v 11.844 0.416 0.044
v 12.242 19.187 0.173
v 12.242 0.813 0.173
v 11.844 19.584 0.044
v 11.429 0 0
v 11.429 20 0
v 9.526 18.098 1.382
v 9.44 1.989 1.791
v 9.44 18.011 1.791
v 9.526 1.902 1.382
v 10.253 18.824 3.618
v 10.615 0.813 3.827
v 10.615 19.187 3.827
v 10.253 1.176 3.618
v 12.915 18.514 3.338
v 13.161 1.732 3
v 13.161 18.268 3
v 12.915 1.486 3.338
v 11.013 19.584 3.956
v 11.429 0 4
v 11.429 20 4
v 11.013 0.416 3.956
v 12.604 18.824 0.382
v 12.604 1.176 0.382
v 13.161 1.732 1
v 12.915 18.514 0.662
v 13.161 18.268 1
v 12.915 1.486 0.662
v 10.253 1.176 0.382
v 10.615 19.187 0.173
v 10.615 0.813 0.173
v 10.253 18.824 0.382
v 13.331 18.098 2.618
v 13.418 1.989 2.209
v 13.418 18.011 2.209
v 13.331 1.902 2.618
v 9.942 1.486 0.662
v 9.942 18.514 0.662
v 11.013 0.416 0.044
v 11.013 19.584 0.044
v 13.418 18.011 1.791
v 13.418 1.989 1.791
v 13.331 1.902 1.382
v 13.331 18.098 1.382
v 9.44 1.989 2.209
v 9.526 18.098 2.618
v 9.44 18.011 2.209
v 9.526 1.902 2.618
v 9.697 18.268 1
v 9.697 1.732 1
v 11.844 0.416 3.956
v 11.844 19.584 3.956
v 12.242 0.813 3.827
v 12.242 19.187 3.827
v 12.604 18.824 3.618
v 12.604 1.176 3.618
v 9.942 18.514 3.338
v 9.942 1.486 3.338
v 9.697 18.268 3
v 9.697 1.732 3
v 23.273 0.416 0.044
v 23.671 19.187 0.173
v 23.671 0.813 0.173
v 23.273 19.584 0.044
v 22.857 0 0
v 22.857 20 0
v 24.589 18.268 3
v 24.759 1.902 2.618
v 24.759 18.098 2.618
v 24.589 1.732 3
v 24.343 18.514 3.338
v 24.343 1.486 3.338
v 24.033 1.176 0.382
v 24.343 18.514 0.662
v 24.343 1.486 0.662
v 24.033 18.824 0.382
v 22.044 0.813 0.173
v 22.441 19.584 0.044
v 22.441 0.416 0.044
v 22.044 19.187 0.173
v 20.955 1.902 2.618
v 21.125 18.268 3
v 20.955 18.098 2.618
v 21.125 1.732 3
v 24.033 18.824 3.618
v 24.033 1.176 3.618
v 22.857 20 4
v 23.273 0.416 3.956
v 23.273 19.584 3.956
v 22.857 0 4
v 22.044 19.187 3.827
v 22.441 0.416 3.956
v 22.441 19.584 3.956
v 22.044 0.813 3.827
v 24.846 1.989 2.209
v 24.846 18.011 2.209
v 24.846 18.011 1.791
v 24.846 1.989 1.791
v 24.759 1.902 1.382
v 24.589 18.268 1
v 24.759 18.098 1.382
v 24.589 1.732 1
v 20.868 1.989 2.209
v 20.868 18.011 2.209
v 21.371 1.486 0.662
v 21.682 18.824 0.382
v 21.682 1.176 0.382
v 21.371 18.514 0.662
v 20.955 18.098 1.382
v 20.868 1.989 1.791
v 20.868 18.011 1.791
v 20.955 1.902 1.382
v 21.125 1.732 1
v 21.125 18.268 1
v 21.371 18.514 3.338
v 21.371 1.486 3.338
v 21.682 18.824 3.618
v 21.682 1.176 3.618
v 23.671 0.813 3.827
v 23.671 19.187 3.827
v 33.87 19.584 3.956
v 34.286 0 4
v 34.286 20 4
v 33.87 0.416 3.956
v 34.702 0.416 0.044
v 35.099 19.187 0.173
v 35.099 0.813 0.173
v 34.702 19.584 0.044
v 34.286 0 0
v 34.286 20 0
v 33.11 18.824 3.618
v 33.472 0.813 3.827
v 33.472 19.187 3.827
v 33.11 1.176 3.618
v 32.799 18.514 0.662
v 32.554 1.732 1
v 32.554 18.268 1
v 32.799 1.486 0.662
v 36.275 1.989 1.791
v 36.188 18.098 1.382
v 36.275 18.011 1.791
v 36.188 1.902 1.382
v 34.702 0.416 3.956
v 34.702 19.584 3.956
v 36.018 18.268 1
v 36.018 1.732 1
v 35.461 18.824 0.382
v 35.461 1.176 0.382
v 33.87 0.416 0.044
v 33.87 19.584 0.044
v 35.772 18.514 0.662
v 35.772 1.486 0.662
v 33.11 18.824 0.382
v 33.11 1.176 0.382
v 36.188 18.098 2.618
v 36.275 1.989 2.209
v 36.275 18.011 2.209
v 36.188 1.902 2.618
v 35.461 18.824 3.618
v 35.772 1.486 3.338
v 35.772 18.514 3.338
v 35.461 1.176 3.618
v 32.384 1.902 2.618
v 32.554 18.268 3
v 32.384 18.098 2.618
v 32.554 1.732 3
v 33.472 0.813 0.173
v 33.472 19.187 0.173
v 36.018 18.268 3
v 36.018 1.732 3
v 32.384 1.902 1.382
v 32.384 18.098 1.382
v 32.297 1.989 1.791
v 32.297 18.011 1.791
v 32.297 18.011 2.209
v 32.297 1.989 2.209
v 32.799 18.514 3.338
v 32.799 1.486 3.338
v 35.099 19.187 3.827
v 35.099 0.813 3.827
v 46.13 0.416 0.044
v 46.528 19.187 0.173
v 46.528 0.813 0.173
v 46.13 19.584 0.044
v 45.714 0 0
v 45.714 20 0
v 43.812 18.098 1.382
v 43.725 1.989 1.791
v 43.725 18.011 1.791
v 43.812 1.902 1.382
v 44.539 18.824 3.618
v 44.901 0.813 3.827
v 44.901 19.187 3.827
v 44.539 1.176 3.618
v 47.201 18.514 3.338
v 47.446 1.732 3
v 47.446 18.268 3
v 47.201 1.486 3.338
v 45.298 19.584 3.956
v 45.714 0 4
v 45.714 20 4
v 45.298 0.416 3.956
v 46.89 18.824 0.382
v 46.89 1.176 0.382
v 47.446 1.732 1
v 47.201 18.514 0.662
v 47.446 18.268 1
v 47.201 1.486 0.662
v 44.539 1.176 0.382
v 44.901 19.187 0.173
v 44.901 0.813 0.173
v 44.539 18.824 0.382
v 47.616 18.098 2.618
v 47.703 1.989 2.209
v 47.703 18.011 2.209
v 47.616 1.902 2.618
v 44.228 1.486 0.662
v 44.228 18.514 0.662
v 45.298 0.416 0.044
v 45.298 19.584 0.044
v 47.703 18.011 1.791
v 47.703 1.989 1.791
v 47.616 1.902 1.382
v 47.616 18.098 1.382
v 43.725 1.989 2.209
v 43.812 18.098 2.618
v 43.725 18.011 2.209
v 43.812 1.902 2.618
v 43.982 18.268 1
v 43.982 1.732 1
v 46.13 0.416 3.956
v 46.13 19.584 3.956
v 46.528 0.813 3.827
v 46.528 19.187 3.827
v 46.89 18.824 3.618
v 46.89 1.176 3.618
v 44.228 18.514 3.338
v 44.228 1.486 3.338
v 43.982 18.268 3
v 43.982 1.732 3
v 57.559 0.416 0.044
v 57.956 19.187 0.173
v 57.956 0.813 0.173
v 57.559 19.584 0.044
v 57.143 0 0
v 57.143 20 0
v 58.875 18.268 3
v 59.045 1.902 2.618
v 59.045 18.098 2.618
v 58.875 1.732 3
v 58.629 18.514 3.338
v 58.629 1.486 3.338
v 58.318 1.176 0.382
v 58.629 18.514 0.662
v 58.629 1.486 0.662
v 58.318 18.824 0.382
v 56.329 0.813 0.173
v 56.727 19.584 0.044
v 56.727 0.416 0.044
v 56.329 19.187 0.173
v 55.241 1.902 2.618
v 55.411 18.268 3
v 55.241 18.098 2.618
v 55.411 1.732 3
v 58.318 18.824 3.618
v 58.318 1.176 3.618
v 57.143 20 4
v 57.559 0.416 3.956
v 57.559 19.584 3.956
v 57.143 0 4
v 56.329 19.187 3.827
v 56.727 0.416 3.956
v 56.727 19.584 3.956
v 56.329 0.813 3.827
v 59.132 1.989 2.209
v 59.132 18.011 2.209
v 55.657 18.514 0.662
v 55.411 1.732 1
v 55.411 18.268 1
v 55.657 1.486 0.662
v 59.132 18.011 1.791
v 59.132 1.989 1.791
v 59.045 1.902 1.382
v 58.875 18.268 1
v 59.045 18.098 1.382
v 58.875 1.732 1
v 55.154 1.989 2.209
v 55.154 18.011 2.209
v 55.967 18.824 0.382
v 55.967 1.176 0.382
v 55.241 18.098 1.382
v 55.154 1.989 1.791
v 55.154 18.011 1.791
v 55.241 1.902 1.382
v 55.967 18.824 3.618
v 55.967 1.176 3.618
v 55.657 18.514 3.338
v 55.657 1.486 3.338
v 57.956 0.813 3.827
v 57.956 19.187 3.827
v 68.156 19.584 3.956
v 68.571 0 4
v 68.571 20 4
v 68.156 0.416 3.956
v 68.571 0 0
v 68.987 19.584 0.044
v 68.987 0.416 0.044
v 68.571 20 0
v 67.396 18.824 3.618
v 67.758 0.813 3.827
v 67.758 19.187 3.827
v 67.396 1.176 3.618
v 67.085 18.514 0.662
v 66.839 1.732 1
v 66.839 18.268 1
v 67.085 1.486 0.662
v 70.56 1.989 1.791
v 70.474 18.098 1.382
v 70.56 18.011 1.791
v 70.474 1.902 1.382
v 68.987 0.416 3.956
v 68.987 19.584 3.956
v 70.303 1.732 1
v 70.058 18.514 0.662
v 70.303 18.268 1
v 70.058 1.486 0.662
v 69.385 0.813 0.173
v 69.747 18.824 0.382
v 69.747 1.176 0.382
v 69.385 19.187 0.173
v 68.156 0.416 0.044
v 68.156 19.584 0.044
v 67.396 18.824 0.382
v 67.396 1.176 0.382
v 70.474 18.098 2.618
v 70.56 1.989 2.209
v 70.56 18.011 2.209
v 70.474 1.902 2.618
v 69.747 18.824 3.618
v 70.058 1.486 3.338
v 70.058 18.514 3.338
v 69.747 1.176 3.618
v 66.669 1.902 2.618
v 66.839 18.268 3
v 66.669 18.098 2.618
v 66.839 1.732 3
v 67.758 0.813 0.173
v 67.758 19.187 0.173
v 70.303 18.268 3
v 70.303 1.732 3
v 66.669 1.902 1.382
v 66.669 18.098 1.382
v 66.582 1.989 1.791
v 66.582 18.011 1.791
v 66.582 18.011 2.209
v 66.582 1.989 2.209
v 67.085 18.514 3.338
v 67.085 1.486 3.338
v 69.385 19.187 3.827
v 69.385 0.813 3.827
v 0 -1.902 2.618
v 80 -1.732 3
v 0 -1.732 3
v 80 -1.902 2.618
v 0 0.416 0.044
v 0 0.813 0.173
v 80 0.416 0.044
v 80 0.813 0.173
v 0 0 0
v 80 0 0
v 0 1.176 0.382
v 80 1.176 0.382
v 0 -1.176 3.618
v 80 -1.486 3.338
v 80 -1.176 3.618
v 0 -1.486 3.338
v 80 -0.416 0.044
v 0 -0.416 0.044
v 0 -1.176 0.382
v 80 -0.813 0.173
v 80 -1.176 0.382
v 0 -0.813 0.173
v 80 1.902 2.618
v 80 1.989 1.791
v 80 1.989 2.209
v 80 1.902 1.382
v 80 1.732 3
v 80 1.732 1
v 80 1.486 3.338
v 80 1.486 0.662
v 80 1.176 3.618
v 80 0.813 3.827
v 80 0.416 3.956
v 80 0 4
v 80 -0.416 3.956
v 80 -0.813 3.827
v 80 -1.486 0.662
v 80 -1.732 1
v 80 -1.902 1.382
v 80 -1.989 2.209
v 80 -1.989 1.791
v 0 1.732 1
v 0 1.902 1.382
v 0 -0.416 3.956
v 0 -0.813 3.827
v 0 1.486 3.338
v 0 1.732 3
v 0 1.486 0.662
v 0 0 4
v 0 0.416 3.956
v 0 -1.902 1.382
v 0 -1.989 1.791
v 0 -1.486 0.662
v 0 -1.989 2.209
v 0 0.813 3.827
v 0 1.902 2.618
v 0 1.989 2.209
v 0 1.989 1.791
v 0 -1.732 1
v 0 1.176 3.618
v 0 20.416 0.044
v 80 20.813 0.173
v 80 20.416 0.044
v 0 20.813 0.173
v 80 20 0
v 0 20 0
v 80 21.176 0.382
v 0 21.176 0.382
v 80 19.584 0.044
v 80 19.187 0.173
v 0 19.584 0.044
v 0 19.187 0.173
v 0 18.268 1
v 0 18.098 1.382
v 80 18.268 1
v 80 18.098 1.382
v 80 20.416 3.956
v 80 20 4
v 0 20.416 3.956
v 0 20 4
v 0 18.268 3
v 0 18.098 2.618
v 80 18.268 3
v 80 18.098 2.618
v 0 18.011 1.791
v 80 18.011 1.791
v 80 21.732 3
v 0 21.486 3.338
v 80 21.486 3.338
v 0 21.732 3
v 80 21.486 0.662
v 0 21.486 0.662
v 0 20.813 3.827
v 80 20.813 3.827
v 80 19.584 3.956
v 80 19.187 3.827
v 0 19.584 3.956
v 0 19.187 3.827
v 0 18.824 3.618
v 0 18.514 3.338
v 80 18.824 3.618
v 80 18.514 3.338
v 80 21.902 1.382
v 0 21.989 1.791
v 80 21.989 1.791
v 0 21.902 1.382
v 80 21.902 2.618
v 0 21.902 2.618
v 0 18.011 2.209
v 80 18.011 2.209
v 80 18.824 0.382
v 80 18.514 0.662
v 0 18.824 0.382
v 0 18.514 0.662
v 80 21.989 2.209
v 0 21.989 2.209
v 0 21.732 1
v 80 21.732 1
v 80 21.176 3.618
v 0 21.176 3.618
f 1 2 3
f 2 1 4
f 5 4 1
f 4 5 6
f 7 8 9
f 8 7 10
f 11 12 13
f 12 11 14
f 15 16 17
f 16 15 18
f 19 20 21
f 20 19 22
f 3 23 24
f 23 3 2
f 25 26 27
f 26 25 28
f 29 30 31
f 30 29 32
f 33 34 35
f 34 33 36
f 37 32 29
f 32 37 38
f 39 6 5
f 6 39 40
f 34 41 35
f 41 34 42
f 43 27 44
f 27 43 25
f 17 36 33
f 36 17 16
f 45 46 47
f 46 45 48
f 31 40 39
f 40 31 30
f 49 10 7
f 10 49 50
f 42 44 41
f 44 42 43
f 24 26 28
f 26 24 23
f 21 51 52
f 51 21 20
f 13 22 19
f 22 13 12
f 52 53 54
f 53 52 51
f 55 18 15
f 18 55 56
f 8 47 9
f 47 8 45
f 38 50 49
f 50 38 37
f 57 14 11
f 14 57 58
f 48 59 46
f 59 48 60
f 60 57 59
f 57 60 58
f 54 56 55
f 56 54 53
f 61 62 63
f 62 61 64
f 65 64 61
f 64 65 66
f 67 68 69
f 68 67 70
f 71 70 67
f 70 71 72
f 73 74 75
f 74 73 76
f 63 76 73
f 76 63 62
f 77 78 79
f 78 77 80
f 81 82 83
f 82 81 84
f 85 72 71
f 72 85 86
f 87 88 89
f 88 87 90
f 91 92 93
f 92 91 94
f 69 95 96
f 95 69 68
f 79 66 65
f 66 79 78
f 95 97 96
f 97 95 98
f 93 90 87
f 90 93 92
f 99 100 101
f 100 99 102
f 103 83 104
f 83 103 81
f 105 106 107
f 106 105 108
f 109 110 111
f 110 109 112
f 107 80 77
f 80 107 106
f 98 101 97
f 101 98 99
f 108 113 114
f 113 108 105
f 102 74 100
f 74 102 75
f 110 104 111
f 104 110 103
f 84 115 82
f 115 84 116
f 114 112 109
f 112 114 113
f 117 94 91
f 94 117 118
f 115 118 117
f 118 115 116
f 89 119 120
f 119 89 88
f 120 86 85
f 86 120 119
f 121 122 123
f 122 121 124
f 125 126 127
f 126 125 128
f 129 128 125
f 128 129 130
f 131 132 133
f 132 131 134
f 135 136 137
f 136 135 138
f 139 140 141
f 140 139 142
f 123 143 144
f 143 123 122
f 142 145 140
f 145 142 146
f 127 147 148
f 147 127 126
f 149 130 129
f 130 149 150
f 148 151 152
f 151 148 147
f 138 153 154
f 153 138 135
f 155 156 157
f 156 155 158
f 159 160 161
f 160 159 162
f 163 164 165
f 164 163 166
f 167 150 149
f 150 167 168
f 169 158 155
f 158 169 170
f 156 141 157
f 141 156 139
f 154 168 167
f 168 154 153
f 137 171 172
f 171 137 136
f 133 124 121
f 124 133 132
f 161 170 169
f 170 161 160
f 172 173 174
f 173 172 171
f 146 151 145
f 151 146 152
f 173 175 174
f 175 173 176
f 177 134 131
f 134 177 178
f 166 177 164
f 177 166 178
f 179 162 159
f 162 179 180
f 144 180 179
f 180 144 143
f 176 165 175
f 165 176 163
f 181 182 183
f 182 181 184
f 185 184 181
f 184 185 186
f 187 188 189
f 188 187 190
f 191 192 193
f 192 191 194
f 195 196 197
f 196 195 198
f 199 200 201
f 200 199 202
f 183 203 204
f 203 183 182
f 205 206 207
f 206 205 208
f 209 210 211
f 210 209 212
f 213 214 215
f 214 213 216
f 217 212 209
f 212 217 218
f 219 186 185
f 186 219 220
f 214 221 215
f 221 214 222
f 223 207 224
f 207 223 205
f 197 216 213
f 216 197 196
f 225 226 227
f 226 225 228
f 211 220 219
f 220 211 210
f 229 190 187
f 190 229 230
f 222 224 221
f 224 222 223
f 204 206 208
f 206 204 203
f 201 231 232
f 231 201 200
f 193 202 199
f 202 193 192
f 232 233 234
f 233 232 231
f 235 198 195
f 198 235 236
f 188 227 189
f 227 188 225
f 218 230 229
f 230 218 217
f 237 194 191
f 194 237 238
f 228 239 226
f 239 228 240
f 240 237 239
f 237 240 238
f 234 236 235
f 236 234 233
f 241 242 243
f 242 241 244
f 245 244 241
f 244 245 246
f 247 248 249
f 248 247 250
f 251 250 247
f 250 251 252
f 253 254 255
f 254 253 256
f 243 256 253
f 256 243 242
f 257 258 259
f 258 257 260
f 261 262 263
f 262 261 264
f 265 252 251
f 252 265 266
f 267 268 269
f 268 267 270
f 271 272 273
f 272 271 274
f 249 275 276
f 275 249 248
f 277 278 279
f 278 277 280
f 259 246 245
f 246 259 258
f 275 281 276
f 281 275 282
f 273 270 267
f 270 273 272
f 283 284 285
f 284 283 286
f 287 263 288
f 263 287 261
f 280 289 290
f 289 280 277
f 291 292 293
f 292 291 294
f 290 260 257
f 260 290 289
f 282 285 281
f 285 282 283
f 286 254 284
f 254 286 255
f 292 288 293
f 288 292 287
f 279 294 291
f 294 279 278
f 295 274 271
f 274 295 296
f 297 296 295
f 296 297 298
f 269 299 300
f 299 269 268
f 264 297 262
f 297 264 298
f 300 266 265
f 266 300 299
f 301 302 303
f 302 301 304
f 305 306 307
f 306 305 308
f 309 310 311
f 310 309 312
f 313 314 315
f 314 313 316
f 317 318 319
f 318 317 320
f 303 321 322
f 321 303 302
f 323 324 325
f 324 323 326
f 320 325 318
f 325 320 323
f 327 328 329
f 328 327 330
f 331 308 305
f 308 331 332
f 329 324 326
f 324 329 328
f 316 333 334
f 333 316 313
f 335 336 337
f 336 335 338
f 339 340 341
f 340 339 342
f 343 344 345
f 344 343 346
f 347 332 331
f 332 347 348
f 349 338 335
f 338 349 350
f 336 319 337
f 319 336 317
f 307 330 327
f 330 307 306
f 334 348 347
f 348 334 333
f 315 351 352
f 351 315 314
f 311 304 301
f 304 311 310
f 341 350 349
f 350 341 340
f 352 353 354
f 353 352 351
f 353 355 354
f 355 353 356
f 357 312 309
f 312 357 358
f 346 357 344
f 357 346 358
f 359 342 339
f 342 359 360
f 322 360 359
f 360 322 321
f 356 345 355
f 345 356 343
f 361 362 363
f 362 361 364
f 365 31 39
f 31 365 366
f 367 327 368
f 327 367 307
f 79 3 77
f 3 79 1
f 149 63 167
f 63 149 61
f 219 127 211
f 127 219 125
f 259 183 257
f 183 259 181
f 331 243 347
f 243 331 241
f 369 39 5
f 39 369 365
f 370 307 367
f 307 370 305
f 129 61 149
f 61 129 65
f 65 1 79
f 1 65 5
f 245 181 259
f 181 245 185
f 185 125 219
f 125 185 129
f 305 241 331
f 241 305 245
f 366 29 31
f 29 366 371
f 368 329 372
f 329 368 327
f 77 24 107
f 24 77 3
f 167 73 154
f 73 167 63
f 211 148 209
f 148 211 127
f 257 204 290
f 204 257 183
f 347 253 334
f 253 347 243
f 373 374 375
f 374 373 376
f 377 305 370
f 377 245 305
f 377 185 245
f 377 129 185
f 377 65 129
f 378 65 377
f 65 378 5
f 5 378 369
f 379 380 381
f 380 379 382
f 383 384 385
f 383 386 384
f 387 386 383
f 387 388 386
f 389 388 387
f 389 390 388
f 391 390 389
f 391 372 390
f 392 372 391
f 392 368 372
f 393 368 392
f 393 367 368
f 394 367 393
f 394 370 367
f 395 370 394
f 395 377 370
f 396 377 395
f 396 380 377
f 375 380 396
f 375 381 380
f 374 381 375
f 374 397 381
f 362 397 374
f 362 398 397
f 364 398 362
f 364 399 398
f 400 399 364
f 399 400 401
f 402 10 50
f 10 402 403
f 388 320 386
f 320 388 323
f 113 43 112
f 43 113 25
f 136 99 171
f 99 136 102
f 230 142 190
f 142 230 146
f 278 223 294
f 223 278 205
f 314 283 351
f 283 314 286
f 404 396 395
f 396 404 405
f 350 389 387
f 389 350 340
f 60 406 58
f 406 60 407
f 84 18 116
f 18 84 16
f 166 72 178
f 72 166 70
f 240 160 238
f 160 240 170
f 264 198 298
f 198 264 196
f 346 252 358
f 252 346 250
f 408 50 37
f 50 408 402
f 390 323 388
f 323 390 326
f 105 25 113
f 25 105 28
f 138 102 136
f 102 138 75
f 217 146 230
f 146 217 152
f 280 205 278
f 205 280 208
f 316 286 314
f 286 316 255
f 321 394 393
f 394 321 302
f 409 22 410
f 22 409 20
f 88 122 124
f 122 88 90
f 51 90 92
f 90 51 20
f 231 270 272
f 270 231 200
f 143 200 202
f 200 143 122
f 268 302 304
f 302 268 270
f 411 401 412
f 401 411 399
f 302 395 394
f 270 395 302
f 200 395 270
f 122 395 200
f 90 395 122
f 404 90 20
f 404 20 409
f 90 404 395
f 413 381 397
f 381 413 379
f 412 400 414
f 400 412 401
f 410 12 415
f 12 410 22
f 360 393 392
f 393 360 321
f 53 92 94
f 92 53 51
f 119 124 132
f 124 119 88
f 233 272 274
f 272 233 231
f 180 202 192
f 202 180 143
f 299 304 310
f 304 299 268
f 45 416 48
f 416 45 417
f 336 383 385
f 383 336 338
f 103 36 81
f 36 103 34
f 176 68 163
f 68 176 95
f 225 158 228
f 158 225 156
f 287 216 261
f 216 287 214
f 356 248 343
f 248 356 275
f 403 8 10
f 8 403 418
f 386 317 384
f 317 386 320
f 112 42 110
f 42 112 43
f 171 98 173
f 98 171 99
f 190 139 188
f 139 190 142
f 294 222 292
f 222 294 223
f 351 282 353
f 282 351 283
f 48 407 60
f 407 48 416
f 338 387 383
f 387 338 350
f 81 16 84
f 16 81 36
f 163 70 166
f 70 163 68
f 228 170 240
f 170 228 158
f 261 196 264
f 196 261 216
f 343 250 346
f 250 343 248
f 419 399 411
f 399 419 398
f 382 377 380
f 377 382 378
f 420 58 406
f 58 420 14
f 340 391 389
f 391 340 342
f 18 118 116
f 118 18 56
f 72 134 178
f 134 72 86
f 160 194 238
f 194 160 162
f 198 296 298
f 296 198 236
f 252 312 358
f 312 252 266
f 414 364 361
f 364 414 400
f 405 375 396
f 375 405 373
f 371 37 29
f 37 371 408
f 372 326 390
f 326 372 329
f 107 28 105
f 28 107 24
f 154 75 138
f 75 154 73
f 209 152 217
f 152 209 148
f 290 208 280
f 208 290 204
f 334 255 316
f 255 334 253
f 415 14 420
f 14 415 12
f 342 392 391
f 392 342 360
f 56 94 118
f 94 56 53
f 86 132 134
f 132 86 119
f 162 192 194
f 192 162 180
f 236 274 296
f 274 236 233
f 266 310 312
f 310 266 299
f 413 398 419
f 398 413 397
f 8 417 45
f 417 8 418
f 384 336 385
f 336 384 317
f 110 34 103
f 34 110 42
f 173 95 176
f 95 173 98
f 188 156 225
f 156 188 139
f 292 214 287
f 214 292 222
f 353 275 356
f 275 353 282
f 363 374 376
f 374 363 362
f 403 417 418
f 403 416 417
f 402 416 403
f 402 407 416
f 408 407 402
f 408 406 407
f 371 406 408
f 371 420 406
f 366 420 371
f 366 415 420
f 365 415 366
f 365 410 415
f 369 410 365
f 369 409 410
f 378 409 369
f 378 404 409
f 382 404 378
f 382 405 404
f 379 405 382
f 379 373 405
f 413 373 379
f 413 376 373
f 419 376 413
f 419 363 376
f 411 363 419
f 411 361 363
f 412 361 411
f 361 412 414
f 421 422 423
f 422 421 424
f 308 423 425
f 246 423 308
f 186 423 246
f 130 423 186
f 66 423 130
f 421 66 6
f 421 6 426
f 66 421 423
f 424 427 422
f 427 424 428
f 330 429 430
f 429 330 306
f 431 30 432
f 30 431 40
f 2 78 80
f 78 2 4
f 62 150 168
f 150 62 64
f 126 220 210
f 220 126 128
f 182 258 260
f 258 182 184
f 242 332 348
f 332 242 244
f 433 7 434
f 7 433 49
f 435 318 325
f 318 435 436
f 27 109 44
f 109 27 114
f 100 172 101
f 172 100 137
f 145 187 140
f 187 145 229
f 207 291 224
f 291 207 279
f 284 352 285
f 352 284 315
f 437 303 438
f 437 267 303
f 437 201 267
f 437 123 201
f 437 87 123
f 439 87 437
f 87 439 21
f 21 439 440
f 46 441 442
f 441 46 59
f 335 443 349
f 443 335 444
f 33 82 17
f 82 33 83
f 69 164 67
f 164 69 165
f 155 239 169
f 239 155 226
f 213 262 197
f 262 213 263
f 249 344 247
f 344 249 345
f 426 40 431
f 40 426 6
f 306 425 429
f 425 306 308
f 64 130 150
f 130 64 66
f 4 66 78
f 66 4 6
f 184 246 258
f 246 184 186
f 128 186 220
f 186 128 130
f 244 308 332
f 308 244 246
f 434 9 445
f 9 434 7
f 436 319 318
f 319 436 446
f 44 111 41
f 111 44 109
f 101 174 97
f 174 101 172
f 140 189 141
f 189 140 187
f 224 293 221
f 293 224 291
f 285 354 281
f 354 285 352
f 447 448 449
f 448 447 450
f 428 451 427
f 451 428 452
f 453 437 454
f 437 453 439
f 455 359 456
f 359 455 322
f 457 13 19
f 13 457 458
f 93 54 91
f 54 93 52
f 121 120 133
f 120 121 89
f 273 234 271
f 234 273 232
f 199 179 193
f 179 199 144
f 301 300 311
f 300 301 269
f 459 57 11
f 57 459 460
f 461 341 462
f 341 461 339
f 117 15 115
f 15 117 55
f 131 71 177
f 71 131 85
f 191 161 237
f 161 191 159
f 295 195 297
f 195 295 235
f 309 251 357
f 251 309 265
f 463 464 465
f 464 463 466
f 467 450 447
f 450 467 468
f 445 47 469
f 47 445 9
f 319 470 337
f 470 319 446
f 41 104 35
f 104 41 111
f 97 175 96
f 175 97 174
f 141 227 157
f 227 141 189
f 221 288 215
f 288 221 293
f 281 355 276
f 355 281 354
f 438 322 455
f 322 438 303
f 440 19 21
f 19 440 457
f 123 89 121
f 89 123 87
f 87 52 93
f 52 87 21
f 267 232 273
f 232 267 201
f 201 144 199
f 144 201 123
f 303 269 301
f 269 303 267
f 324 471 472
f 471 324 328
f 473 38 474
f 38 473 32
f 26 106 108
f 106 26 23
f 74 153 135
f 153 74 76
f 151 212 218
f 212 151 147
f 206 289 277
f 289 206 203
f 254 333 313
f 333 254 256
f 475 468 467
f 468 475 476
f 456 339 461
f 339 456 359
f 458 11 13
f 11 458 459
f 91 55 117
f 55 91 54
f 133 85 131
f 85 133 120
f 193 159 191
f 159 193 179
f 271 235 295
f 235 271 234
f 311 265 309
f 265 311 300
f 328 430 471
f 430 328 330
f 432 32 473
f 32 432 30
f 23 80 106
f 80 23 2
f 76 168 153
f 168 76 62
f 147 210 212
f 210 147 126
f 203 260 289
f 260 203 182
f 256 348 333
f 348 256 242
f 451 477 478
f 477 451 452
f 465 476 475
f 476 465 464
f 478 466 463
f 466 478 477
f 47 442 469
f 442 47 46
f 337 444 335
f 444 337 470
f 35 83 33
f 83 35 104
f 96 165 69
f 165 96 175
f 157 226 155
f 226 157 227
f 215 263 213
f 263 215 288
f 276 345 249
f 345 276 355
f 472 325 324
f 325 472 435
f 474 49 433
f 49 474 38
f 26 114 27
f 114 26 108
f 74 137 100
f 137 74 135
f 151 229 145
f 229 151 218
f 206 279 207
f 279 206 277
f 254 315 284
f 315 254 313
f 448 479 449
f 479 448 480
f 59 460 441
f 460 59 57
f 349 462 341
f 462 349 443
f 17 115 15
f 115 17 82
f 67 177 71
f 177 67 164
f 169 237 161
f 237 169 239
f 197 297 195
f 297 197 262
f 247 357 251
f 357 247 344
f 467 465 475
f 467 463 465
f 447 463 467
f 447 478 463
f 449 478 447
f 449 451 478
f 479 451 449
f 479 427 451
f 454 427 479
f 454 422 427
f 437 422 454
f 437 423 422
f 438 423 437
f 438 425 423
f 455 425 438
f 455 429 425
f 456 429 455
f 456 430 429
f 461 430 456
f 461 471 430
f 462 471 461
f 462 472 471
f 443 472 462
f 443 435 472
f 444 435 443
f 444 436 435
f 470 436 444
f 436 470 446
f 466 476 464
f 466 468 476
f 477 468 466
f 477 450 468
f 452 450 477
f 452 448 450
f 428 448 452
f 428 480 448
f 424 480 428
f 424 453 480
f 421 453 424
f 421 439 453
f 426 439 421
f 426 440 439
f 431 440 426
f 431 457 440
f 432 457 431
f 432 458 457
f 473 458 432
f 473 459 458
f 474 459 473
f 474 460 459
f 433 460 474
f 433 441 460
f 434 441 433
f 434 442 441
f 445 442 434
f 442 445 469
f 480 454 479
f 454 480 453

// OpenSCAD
// LadderMaker  v1.0    Cylinder Version    BMB
// Simple ladder (or ladder shaped) maker script.  

// Usage: 1) Set desired user values below, 2) Render with F6, 
// 3) Export to STL, 4) Slice and print.  
// NOTE:  This script has no logic to protect you from putting in crazy
//        settings.  But if the render looks good it should print fine.
 
// ***** User Render Settings
$fn = 30;         // Minimum Angle (number of fragments when rendering, probably don't need to change)
lHeight = 80;     // Ladder Height mm (end-to-end)
lWidth = 20;      // Ladder Width mm (oc-to-oc)
lRungs = 6;       // Number of Rungs  
lRadius = 2;      // Ladder Radius mm  (remember it's radius not diameter!) 
// ***** End User Settings


gap = lHeight / (lRungs + 1);
echo("Rung Spacing: ", gap);
translate([0,0,lRadius]) {
  rotate(a=90,v=[0,1,0]) {
    cylinder(h=lHeight,r=lRadius);
      translate([0,lWidth,0]) {
        cylinder(h=lHeight,r=lRadius);  
      }
   
    for(a=[gap:gap:lHeight-gap/2]) {  
      rotate(a=90,v=[1,0,0]) {
        translate([0,a,-1*(lWidth)]) { 
          echo("Rung: ", a);  
          cylinder(h=lWidth,r=lRadius);
        }
      }
    }
  }
}
